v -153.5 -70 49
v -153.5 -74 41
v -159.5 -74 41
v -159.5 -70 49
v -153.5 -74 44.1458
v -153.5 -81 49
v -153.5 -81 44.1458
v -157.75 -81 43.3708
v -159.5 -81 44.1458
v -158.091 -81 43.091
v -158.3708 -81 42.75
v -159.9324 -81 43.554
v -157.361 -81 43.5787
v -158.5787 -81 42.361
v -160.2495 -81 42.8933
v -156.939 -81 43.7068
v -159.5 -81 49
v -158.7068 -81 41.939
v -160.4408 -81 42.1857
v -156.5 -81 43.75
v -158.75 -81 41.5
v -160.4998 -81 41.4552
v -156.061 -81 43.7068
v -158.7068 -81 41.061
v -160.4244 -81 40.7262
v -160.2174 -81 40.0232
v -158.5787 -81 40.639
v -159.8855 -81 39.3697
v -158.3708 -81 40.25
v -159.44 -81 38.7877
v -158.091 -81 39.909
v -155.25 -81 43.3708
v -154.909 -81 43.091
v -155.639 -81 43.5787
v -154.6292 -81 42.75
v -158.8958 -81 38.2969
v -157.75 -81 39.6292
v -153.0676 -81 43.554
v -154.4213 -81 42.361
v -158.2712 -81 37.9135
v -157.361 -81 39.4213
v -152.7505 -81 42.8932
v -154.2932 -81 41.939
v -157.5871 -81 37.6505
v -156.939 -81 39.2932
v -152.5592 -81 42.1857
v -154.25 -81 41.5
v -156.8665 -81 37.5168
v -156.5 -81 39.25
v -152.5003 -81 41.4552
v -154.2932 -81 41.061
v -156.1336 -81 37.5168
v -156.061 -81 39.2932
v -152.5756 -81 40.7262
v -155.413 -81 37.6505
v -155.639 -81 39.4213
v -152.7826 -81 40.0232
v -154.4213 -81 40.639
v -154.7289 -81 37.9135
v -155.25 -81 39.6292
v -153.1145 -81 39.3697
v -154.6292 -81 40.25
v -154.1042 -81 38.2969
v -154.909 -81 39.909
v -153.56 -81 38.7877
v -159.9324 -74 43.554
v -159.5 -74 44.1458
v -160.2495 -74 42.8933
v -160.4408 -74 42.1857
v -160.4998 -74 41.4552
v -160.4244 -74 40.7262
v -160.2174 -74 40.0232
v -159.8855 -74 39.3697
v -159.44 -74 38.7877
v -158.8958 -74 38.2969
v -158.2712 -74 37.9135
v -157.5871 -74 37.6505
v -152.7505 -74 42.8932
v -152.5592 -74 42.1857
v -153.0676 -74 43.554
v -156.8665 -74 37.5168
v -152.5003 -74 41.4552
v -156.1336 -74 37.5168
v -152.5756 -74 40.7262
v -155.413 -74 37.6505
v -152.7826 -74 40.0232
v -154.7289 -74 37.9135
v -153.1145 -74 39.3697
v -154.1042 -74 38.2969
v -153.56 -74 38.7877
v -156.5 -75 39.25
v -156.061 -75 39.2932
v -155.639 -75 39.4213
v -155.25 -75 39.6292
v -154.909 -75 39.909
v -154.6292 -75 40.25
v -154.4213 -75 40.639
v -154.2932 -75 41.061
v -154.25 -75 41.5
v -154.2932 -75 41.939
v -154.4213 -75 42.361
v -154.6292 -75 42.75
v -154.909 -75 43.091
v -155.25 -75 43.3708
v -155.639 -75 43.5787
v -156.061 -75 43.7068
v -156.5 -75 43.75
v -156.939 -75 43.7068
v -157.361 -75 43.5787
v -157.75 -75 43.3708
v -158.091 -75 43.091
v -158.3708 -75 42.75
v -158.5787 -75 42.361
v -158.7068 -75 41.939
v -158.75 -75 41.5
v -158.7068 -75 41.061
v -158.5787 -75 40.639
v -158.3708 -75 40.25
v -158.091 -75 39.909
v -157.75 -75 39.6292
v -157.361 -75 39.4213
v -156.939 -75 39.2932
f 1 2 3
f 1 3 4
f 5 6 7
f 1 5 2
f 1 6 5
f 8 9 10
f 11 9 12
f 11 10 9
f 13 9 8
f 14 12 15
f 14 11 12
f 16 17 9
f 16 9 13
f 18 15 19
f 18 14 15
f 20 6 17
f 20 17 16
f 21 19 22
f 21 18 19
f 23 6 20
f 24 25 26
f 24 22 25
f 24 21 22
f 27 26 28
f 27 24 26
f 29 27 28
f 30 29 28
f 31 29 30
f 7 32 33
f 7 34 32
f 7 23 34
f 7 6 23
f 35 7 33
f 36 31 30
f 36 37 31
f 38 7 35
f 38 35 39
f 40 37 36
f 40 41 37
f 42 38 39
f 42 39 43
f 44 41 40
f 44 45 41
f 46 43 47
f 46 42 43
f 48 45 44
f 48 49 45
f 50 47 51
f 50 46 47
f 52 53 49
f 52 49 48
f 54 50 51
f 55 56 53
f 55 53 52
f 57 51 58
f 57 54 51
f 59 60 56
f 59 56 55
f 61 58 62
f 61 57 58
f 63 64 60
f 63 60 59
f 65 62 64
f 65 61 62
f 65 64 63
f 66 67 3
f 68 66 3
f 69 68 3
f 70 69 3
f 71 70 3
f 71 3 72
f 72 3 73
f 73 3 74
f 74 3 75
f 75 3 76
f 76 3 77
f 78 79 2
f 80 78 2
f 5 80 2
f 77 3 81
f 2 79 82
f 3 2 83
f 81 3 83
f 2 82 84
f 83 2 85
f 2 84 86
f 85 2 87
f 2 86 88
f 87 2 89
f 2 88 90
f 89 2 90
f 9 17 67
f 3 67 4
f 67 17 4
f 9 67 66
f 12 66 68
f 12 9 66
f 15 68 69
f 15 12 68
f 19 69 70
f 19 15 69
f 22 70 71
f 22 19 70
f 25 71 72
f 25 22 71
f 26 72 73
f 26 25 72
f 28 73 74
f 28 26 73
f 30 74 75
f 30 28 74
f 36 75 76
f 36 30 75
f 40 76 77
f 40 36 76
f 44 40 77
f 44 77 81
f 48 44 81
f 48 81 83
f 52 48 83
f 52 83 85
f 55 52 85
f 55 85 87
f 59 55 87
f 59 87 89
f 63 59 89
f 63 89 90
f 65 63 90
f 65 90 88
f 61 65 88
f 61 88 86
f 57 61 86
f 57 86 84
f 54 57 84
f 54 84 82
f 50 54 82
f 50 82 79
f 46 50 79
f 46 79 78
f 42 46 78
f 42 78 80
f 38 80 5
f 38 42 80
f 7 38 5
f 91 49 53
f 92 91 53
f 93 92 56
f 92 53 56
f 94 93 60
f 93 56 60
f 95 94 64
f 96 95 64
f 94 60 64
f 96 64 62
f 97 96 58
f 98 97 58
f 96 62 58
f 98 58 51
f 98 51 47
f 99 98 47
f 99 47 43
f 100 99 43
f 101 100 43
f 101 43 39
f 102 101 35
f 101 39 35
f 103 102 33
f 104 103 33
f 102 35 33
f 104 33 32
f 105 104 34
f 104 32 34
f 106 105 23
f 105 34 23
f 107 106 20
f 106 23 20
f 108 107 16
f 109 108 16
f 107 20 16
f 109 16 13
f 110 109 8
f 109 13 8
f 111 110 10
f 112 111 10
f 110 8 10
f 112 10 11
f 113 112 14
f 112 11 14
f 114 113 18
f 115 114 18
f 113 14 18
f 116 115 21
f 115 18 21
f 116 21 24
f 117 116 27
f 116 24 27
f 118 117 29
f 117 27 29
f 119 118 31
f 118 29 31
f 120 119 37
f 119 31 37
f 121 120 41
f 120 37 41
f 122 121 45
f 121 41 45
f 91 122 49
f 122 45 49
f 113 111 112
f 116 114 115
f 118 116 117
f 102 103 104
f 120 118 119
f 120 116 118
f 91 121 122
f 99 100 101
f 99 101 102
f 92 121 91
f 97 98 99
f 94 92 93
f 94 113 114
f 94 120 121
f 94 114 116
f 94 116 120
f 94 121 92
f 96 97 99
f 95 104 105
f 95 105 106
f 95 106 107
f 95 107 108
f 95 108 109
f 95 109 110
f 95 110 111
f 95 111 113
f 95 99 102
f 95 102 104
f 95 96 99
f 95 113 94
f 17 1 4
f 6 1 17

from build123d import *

# Parameters (mm, degrees)
PAD001_DEPTH    = 3
SKETCH006_R     = 4
PAD002_DEPTH    = 7
SKETCH007_R     = 2.25
POCKET002_DEPTH = 6


with BuildPart() as part:
    # Sketch005 → Pad001 (new body, symmetric)
    with BuildSketch(Plane.YZ.offset(-156.5)):
        Polygon((-81.000001, 49), (-81.000001, 41), (-74, 41), (-70, 49), align=None)
    extrude(amount=PAD001_DEPTH, both=True)

    # Sketch006 (on Face1 of Pad001) → Pad002 (join)
    with BuildSketch(Plane(origin=(0, -81.000001, 0), x_dir=(0, 0, -1), z_dir=(0, -1, 0))):
        with Locations((-41.500001, -156.500002)):
            Circle(SKETCH006_R)
    extrude(amount=-PAD002_DEPTH)

    # Sketch007 (on Face7 of Pad002) → Pocket002 (cut)
    with BuildSketch(Plane(origin=(0, -81.000001, 0), x_dir=(0, 0, -1), z_dir=(0, -1, 0))):
        with Locations((-41.500001, -156.500002)):
            Circle(SKETCH007_R)
    extrude(amount=-POCKET002_DEPTH, mode=Mode.SUBTRACT)


solid = part.part
